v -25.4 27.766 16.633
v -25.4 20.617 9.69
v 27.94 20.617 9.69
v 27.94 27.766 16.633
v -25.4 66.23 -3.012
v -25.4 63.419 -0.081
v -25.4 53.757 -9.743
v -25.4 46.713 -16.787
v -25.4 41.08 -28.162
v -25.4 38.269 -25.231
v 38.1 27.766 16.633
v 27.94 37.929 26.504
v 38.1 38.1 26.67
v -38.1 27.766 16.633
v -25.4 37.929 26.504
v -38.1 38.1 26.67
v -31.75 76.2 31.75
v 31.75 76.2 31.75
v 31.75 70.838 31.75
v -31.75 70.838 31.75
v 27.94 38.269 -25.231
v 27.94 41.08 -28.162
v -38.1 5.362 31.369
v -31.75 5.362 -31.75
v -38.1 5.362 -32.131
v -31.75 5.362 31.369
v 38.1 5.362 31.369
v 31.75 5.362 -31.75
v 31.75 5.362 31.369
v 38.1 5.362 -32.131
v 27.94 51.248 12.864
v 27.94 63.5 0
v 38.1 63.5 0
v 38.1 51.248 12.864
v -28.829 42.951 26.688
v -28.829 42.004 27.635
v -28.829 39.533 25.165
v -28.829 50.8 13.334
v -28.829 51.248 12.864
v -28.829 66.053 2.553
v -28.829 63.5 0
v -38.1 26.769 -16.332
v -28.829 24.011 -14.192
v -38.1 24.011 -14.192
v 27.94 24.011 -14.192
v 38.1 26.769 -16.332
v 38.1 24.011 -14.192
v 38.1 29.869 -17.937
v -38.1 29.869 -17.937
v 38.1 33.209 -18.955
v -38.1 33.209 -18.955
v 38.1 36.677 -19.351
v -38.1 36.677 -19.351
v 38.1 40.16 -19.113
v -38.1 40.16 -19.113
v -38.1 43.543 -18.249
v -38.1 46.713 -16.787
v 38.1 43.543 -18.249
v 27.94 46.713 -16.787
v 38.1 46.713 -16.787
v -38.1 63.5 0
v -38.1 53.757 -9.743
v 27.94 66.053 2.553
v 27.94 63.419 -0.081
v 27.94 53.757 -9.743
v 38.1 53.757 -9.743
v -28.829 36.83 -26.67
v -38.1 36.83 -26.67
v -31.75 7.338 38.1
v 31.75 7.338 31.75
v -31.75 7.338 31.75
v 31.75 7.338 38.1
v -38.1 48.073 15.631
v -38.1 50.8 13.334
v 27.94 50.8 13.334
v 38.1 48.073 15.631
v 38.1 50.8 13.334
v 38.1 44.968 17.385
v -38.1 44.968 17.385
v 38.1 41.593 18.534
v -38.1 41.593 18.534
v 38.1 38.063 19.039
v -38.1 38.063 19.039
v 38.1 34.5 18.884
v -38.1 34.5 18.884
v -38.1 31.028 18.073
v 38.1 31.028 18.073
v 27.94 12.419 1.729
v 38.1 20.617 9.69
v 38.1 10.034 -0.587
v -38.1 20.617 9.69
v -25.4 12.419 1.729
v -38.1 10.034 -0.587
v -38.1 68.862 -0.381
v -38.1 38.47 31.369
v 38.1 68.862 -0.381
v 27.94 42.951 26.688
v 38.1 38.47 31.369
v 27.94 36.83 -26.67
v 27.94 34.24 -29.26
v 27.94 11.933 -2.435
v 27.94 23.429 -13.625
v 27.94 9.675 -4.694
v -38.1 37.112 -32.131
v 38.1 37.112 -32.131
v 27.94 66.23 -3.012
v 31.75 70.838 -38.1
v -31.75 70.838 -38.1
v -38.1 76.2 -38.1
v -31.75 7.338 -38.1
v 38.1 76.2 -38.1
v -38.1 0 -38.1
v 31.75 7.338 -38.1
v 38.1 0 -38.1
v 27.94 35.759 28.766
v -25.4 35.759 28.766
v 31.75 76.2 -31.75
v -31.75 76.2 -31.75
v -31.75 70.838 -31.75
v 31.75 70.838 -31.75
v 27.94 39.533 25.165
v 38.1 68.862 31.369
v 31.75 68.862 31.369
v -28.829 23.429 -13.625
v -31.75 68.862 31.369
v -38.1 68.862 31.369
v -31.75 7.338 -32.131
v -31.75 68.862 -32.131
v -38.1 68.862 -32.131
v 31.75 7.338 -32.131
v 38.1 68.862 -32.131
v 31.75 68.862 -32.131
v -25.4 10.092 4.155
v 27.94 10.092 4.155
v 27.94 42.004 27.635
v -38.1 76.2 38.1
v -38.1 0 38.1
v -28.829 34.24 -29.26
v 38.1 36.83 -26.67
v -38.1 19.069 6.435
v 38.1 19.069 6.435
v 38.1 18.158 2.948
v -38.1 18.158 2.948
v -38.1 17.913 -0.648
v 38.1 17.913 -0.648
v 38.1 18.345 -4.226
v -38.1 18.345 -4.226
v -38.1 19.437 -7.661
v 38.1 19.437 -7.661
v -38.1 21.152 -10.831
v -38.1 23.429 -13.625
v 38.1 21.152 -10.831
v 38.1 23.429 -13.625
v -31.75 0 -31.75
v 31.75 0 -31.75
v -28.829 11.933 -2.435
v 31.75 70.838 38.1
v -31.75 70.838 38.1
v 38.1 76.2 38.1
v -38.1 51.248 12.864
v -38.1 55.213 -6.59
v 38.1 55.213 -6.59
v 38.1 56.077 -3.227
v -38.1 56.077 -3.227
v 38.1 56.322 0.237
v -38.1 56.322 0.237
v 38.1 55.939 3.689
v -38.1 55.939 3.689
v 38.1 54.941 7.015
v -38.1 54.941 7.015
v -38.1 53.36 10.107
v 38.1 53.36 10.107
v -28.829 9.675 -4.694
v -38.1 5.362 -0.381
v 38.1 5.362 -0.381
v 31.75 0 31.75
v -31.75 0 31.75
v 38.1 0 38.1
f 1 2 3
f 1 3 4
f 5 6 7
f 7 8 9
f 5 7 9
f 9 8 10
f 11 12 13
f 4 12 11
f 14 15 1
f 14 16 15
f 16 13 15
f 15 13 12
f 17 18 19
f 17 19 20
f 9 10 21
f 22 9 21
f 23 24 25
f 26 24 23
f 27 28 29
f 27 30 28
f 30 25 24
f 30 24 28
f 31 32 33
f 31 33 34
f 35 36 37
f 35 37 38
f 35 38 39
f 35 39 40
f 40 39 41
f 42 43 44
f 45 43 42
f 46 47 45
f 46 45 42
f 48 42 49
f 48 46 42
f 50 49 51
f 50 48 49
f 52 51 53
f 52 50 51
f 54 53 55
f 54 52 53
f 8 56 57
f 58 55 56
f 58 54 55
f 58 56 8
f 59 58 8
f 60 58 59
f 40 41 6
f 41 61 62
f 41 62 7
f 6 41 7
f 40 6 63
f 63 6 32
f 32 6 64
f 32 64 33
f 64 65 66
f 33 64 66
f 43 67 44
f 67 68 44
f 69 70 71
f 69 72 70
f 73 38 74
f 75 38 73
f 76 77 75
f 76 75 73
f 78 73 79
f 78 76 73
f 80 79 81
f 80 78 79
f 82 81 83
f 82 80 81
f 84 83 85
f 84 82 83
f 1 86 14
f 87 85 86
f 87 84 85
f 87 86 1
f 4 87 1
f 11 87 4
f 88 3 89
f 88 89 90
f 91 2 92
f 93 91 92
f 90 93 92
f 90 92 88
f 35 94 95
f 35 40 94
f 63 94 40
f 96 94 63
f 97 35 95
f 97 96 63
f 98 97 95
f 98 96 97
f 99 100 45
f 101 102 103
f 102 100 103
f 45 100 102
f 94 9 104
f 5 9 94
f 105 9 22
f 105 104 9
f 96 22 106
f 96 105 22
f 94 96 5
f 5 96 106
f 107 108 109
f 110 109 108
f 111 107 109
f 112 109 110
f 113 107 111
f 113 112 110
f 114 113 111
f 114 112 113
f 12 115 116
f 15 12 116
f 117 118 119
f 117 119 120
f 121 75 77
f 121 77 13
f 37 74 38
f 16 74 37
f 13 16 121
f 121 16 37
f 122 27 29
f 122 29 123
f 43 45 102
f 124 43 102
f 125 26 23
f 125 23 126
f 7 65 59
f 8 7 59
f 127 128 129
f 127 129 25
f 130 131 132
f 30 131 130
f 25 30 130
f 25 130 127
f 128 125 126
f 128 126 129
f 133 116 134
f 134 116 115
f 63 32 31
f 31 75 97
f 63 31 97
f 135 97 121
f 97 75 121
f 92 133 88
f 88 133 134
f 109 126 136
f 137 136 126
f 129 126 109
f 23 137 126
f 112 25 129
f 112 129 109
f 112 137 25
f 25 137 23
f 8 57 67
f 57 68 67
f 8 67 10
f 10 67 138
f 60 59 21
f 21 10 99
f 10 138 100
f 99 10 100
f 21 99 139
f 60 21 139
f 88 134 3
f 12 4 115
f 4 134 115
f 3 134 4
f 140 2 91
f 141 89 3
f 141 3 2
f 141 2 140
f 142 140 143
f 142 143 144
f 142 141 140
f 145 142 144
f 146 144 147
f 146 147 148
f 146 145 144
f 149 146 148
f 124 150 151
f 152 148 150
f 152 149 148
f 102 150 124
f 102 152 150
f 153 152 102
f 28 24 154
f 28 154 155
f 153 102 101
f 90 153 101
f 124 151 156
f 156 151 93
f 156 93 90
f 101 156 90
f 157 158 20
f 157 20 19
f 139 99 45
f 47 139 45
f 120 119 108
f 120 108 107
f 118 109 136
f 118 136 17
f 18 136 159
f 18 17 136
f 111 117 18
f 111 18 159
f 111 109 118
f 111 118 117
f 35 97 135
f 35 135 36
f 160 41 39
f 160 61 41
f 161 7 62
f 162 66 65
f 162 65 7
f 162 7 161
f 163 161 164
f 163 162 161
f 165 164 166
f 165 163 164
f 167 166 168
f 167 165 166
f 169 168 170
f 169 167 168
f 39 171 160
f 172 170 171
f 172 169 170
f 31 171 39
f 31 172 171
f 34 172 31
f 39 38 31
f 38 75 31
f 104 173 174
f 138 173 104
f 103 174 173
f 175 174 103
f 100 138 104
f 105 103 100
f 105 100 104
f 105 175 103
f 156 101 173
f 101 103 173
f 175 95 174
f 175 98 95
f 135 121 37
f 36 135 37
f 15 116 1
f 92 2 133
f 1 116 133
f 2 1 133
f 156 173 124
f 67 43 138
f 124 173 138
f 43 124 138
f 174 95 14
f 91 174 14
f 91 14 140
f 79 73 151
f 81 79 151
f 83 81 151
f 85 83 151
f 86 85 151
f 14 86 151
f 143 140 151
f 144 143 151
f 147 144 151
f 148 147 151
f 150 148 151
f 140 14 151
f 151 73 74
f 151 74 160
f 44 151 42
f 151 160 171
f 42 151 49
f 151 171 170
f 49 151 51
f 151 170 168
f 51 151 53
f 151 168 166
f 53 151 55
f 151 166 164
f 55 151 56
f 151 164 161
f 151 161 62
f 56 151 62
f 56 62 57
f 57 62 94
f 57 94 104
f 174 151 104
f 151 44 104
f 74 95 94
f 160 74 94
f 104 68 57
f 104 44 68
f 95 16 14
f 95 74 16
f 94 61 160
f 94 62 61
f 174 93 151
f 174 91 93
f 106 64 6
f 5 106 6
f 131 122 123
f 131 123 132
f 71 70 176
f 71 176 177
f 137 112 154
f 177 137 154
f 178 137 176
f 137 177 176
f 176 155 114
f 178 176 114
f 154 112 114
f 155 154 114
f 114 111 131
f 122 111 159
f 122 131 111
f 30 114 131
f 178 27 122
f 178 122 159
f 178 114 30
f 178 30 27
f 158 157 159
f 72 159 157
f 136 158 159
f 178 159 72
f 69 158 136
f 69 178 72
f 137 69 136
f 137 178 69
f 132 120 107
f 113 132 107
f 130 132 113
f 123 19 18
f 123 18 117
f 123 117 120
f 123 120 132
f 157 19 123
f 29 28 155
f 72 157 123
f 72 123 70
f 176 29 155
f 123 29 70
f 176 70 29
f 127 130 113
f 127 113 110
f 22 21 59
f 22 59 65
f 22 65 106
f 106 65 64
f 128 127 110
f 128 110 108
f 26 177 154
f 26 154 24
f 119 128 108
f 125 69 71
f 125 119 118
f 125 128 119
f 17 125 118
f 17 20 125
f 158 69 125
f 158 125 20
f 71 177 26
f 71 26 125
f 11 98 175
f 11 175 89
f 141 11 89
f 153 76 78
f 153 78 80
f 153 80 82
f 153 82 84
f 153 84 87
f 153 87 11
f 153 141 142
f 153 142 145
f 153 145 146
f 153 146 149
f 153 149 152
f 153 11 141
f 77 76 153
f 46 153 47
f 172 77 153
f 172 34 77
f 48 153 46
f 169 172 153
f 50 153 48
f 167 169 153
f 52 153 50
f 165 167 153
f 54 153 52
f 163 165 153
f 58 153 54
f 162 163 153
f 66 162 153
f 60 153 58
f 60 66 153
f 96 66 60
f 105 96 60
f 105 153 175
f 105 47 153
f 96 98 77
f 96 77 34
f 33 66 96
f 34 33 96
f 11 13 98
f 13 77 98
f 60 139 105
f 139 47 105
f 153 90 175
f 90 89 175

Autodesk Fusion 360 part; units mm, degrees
sketch "Sketch1" plane through (0, 0, 0) normal (0, 1, 0) x (1, 0, 0)
  line L0 (-38.1, 38.1) -> (38.1, 38.1)
  line L1 (38.1, 38.1) -> (38.1, -38.1)
  line L2 (38.1, -38.1) -> (-38.1, -38.1)
  line L3 (-38.1, -38.1) -> (-38.1, 38.1)
  line L4 (-38.1, 38.1) -> (38.1, -38.1) construction
  line L5 (38.1, 38.1) -> (-38.1, -38.1) construction
  dimension "d1" = 76.2
  dimension "d2" = 76.2
extrude "Extrude1" add sketch "Sketch1" along normal blind 76.2 makes body 1
sketch "Sketch2" plane through (0, 76.2, 0) normal (0, 1, 0) x (-1, 0, 0)
  line L0 (38.1, 38.1) -> (-38.1, 38.1)
  line L1 (-38.1, 38.1) -> (-38.1, -38.1)
  line L2 (-38.1, -38.1) -> (38.1, -38.1)
  line L3 (38.1, -38.1) -> (38.1, 38.1)
  line L4 (31.75, -31.75) -> (-31.75, -31.75)
  line L5 (-31.75, -31.75) -> (-31.75, 31.75)
  line L6 (-31.75, 31.75) -> (31.75, 31.75)
  line L7 (31.75, 31.75) -> (31.75, -31.75)
  line L8 (31.75, -31.75) -> (-31.75, 31.75) construction
  line L9 (-31.75, -31.75) -> (31.75, 31.75) construction
  dimension "d5" = 63.5
  dimension "d6" = 63.5
extrude "Extrude2" cut sketch "Sketch2" against normal blind 81.28 contours L4 L5 L6 L7 bodies 1
sketch "Sketch3" plane through (0, 0, 38.1) normal (0, 0, 1) x (1, 0, 0)
  line L0 (-38.1, 0) -> (38.1, 0)
  line L1 (38.1, 0) -> (38.1, 76.2)
  line L2 (38.1, 76.2) -> (-38.1, 76.2)
  line L3 (-38.1, 76.2) -> (-38.1, 0)
  line L4 (-31.75, 70.8385) -> (31.75, 70.8385)
  line L5 (31.75, 70.8385) -> (31.75, 7.3385)
  line L6 (31.75, 7.3385) -> (-31.75, 7.3385)
  line L7 (-31.75, 7.3385) -> (-31.75, 70.8385)
  line L8 (-31.75, 70.8385) -> (31.75, 7.3385) construction
  line L9 (31.75, 70.8385) -> (-31.75, 7.3385) construction
  line L10 (-31.75, 76.2) -> (-31.75, 0)
  point P0 (0, 39.0885)
  dimension "d9" = 63.5
  dimension "d10" = 63.5
extrude "Extrude3" cut sketch "Sketch3" against normal blind 78.74 contours L4 L5 L6 L7 L10 bodies 1
sketch "Sketch4" plane through (38.1, 0, 0) normal (1, 0, 0) x (0, 0, -1)
  line L0 (-38.1, 0) -> (38.1, 0)
  line L1 (38.1, 0) -> (38.1, 76.2)
  line L2 (38.1, 76.2) -> (-38.1, 76.2)
  line L3 (-38.1, 76.2) -> (-38.1, 0)
  line L4 (-31.3693, 68.8615) -> (32.1307, 68.8615)
  line L5 (32.1307, 68.8615) -> (32.1307, 5.3615)
  line L6 (32.1307, 5.3615) -> (-31.3693, 5.3615)
  line L7 (-31.3693, 5.3615) -> (-31.3693, 68.8615)
  line L8 (-31.3693, 68.8615) -> (32.1307, 5.3615) construction
  line L9 (32.1307, 68.8615) -> (-31.3693, 5.3615) construction
  point P0 (0.3807, 37.1115)
  dimension "d13" = 63.5
  dimension "d14" = 63.5
extrude "Extrude4" cut sketch "Sketch4" against normal blind 81.28 contours L4 L5 L6 L7 bodies 1
sketch "Sketch5" plane through (0, 0, 0) normal (1, 0, 0) x (0, 0, -1)
sketch "Sketch6" plane through (38.1, 0, 0) normal (1, 0, 0) x (0, 0, -1)
  line L0 (32.1307, 68.8615) -> (32.1307, 5.3615)
  line L1 (32.1307, 5.3615) -> (-31.3693, 5.3615)
  line L2 (-31.3693, 5.3615) -> (-31.3693, 68.8615)
  line L3 (-31.3693, 68.8615) -> (32.1307, 68.8615)
  line L4 (-38.1, 0) -> (38.1, 0)
  line L5 (38.1, 0) -> (38.1, 76.2)
  line L6 (38.1, 76.2) -> (-38.1, 76.2)
  line L7 (-38.1, 76.2) -> (-38.1, 0)
  line L8 (0.3807, 68.8615) -> (-31.3693, 38.4696)
  line L9 (-31.3693, 38.4696) -> (0.3807, 5.3615)
  line L10 (0.3807, 5.3615) -> (32.1307, 37.1115)
  line L11 (32.1307, 37.1115) -> (0.3807, 68.8615)
  point P0 (0.5787, 32.6023)
  point P1 (0.5786, 31.857)
extrude "Extrude5" add sketch "Sketch6" against normal blind 76.2 separate body contours L8 L9 L10 L11 makes body 2
sketch "Sketch7" plane through (-38.1, 0, 0) normal (-1, 0, 0) x (0, 0, 1)
  line L0 (-0.3807, 68.8615) -> (-32.1307, 37.1115)
  line L1 (-32.1307, 37.1115) -> (-0.3807, 5.3615)
  line L2 (-0.3807, 5.3615) -> (31.3693, 38.4696)
  line L3 (31.3693, 38.4696) -> (-0.3807, 68.8615)
  line L4 (0, 63.5) -> (26.67, 38.1)
  line L5 (0, 63.5) -> (-26.67, 36.83)
  line L6 (-26.67, 36.83) -> (-0.5866, 10.0345)
  line L7 (26.67, 38.1) -> (-0.5866, 10.0345)
extrude "Extrude6" cut sketch "Sketch7" against normal blind 76.2 contours L4 L5 L6 L7 bodies 2
sketch "Sketch8" plane through (0, 2.7587, -2.8767) normal (0, -0.6921, 0.7218) x (1, 0, 0)
  line L0 (38.1, 3.6062) -> (38.1, 49.4778)
  line L1 (38.1, 49.4778) -> (-38.1, 49.4778)
  line L2 (-38.1, 49.4778) -> (-38.1, 3.6062)
  line L3 (-38.1, 3.6062) -> (38.1, 3.6062)
  line L4 (-25.4, 45.72) -> (-25.4, 10.16)
  line L5 (-25.4, 10.16) -> (27.94, 10.16)
  line L6 (27.94, 10.16) -> (27.94, 45.72)
  line L7 (27.94, 45.72) -> (-25.4, 45.72)
extrude "Extrude7" cut sketch "Sketch8" against normal blind 45.72 contours L4 L5 L6 L7 bodies 2
sketch "Sketch9" plane through (0, 2.4904, 2.4904) normal (0, -0.7071, -0.7071) x (-1, 0, 0)
  line L0 (-38.1, 48.9616) -> (-38.1, 4.0604)
  line L1 (-38.1, 4.0604) -> (38.1, 4.0604)
  line L2 (38.1, 4.0604) -> (38.1, 48.9616)
  line L3 (38.1, 48.9616) -> (-38.1, 48.9616)
  line L4 (-27.94, 10.16) -> (28.8286, 10.16)
  line L5 (28.8286, 10.16) -> (28.8286, 44.9013)
  line L6 (28.8286, 44.9013) -> (-27.94, 44.9013)
  line L7 (-27.94, 44.9013) -> (-27.94, 10.16)
extrude "Extrude8" cut sketch "Sketch9" against normal blind 45.72 contours L4 L5 L6 L7 bodies 2
sketch "Sketch10" plane through (38.1, 0, 0) normal (1, 0, 0) x (0, 0, -1)
  line L0 (26.67, 36.83) -> (0.5866, 10.0345)
  line L1 (0.5866, 10.0345) -> (-26.67, 38.1)
  line L2 (-26.67, 38.1) -> (0, 63.5)
  line L3 (0, 63.5) -> (26.67, 36.83)
  line L4 (32.1307, 37.1115) -> (0.3807, 68.8615)
  line L5 (0.3807, 68.8615) -> (-31.3693, 38.4696)
  line L6 (-31.3693, 38.4696) -> (0.3807, 5.3615)
  line L7 (0.3807, 5.3615) -> (32.1307, 37.1115)
  circle A0 centre (0.1467, 37.1161) radius 19.2095
extrude "Extrude9" add sketch "Sketch10" against normal blind 73.66 contours L0 L1 L2 L3 A0 bodies 2
extrude "Extrude10" add 1 faces at (-35.56, 41.068, -3.9719) along direction (-1, 0, 0) blind 2.54 on bodies 2 bodies 2
